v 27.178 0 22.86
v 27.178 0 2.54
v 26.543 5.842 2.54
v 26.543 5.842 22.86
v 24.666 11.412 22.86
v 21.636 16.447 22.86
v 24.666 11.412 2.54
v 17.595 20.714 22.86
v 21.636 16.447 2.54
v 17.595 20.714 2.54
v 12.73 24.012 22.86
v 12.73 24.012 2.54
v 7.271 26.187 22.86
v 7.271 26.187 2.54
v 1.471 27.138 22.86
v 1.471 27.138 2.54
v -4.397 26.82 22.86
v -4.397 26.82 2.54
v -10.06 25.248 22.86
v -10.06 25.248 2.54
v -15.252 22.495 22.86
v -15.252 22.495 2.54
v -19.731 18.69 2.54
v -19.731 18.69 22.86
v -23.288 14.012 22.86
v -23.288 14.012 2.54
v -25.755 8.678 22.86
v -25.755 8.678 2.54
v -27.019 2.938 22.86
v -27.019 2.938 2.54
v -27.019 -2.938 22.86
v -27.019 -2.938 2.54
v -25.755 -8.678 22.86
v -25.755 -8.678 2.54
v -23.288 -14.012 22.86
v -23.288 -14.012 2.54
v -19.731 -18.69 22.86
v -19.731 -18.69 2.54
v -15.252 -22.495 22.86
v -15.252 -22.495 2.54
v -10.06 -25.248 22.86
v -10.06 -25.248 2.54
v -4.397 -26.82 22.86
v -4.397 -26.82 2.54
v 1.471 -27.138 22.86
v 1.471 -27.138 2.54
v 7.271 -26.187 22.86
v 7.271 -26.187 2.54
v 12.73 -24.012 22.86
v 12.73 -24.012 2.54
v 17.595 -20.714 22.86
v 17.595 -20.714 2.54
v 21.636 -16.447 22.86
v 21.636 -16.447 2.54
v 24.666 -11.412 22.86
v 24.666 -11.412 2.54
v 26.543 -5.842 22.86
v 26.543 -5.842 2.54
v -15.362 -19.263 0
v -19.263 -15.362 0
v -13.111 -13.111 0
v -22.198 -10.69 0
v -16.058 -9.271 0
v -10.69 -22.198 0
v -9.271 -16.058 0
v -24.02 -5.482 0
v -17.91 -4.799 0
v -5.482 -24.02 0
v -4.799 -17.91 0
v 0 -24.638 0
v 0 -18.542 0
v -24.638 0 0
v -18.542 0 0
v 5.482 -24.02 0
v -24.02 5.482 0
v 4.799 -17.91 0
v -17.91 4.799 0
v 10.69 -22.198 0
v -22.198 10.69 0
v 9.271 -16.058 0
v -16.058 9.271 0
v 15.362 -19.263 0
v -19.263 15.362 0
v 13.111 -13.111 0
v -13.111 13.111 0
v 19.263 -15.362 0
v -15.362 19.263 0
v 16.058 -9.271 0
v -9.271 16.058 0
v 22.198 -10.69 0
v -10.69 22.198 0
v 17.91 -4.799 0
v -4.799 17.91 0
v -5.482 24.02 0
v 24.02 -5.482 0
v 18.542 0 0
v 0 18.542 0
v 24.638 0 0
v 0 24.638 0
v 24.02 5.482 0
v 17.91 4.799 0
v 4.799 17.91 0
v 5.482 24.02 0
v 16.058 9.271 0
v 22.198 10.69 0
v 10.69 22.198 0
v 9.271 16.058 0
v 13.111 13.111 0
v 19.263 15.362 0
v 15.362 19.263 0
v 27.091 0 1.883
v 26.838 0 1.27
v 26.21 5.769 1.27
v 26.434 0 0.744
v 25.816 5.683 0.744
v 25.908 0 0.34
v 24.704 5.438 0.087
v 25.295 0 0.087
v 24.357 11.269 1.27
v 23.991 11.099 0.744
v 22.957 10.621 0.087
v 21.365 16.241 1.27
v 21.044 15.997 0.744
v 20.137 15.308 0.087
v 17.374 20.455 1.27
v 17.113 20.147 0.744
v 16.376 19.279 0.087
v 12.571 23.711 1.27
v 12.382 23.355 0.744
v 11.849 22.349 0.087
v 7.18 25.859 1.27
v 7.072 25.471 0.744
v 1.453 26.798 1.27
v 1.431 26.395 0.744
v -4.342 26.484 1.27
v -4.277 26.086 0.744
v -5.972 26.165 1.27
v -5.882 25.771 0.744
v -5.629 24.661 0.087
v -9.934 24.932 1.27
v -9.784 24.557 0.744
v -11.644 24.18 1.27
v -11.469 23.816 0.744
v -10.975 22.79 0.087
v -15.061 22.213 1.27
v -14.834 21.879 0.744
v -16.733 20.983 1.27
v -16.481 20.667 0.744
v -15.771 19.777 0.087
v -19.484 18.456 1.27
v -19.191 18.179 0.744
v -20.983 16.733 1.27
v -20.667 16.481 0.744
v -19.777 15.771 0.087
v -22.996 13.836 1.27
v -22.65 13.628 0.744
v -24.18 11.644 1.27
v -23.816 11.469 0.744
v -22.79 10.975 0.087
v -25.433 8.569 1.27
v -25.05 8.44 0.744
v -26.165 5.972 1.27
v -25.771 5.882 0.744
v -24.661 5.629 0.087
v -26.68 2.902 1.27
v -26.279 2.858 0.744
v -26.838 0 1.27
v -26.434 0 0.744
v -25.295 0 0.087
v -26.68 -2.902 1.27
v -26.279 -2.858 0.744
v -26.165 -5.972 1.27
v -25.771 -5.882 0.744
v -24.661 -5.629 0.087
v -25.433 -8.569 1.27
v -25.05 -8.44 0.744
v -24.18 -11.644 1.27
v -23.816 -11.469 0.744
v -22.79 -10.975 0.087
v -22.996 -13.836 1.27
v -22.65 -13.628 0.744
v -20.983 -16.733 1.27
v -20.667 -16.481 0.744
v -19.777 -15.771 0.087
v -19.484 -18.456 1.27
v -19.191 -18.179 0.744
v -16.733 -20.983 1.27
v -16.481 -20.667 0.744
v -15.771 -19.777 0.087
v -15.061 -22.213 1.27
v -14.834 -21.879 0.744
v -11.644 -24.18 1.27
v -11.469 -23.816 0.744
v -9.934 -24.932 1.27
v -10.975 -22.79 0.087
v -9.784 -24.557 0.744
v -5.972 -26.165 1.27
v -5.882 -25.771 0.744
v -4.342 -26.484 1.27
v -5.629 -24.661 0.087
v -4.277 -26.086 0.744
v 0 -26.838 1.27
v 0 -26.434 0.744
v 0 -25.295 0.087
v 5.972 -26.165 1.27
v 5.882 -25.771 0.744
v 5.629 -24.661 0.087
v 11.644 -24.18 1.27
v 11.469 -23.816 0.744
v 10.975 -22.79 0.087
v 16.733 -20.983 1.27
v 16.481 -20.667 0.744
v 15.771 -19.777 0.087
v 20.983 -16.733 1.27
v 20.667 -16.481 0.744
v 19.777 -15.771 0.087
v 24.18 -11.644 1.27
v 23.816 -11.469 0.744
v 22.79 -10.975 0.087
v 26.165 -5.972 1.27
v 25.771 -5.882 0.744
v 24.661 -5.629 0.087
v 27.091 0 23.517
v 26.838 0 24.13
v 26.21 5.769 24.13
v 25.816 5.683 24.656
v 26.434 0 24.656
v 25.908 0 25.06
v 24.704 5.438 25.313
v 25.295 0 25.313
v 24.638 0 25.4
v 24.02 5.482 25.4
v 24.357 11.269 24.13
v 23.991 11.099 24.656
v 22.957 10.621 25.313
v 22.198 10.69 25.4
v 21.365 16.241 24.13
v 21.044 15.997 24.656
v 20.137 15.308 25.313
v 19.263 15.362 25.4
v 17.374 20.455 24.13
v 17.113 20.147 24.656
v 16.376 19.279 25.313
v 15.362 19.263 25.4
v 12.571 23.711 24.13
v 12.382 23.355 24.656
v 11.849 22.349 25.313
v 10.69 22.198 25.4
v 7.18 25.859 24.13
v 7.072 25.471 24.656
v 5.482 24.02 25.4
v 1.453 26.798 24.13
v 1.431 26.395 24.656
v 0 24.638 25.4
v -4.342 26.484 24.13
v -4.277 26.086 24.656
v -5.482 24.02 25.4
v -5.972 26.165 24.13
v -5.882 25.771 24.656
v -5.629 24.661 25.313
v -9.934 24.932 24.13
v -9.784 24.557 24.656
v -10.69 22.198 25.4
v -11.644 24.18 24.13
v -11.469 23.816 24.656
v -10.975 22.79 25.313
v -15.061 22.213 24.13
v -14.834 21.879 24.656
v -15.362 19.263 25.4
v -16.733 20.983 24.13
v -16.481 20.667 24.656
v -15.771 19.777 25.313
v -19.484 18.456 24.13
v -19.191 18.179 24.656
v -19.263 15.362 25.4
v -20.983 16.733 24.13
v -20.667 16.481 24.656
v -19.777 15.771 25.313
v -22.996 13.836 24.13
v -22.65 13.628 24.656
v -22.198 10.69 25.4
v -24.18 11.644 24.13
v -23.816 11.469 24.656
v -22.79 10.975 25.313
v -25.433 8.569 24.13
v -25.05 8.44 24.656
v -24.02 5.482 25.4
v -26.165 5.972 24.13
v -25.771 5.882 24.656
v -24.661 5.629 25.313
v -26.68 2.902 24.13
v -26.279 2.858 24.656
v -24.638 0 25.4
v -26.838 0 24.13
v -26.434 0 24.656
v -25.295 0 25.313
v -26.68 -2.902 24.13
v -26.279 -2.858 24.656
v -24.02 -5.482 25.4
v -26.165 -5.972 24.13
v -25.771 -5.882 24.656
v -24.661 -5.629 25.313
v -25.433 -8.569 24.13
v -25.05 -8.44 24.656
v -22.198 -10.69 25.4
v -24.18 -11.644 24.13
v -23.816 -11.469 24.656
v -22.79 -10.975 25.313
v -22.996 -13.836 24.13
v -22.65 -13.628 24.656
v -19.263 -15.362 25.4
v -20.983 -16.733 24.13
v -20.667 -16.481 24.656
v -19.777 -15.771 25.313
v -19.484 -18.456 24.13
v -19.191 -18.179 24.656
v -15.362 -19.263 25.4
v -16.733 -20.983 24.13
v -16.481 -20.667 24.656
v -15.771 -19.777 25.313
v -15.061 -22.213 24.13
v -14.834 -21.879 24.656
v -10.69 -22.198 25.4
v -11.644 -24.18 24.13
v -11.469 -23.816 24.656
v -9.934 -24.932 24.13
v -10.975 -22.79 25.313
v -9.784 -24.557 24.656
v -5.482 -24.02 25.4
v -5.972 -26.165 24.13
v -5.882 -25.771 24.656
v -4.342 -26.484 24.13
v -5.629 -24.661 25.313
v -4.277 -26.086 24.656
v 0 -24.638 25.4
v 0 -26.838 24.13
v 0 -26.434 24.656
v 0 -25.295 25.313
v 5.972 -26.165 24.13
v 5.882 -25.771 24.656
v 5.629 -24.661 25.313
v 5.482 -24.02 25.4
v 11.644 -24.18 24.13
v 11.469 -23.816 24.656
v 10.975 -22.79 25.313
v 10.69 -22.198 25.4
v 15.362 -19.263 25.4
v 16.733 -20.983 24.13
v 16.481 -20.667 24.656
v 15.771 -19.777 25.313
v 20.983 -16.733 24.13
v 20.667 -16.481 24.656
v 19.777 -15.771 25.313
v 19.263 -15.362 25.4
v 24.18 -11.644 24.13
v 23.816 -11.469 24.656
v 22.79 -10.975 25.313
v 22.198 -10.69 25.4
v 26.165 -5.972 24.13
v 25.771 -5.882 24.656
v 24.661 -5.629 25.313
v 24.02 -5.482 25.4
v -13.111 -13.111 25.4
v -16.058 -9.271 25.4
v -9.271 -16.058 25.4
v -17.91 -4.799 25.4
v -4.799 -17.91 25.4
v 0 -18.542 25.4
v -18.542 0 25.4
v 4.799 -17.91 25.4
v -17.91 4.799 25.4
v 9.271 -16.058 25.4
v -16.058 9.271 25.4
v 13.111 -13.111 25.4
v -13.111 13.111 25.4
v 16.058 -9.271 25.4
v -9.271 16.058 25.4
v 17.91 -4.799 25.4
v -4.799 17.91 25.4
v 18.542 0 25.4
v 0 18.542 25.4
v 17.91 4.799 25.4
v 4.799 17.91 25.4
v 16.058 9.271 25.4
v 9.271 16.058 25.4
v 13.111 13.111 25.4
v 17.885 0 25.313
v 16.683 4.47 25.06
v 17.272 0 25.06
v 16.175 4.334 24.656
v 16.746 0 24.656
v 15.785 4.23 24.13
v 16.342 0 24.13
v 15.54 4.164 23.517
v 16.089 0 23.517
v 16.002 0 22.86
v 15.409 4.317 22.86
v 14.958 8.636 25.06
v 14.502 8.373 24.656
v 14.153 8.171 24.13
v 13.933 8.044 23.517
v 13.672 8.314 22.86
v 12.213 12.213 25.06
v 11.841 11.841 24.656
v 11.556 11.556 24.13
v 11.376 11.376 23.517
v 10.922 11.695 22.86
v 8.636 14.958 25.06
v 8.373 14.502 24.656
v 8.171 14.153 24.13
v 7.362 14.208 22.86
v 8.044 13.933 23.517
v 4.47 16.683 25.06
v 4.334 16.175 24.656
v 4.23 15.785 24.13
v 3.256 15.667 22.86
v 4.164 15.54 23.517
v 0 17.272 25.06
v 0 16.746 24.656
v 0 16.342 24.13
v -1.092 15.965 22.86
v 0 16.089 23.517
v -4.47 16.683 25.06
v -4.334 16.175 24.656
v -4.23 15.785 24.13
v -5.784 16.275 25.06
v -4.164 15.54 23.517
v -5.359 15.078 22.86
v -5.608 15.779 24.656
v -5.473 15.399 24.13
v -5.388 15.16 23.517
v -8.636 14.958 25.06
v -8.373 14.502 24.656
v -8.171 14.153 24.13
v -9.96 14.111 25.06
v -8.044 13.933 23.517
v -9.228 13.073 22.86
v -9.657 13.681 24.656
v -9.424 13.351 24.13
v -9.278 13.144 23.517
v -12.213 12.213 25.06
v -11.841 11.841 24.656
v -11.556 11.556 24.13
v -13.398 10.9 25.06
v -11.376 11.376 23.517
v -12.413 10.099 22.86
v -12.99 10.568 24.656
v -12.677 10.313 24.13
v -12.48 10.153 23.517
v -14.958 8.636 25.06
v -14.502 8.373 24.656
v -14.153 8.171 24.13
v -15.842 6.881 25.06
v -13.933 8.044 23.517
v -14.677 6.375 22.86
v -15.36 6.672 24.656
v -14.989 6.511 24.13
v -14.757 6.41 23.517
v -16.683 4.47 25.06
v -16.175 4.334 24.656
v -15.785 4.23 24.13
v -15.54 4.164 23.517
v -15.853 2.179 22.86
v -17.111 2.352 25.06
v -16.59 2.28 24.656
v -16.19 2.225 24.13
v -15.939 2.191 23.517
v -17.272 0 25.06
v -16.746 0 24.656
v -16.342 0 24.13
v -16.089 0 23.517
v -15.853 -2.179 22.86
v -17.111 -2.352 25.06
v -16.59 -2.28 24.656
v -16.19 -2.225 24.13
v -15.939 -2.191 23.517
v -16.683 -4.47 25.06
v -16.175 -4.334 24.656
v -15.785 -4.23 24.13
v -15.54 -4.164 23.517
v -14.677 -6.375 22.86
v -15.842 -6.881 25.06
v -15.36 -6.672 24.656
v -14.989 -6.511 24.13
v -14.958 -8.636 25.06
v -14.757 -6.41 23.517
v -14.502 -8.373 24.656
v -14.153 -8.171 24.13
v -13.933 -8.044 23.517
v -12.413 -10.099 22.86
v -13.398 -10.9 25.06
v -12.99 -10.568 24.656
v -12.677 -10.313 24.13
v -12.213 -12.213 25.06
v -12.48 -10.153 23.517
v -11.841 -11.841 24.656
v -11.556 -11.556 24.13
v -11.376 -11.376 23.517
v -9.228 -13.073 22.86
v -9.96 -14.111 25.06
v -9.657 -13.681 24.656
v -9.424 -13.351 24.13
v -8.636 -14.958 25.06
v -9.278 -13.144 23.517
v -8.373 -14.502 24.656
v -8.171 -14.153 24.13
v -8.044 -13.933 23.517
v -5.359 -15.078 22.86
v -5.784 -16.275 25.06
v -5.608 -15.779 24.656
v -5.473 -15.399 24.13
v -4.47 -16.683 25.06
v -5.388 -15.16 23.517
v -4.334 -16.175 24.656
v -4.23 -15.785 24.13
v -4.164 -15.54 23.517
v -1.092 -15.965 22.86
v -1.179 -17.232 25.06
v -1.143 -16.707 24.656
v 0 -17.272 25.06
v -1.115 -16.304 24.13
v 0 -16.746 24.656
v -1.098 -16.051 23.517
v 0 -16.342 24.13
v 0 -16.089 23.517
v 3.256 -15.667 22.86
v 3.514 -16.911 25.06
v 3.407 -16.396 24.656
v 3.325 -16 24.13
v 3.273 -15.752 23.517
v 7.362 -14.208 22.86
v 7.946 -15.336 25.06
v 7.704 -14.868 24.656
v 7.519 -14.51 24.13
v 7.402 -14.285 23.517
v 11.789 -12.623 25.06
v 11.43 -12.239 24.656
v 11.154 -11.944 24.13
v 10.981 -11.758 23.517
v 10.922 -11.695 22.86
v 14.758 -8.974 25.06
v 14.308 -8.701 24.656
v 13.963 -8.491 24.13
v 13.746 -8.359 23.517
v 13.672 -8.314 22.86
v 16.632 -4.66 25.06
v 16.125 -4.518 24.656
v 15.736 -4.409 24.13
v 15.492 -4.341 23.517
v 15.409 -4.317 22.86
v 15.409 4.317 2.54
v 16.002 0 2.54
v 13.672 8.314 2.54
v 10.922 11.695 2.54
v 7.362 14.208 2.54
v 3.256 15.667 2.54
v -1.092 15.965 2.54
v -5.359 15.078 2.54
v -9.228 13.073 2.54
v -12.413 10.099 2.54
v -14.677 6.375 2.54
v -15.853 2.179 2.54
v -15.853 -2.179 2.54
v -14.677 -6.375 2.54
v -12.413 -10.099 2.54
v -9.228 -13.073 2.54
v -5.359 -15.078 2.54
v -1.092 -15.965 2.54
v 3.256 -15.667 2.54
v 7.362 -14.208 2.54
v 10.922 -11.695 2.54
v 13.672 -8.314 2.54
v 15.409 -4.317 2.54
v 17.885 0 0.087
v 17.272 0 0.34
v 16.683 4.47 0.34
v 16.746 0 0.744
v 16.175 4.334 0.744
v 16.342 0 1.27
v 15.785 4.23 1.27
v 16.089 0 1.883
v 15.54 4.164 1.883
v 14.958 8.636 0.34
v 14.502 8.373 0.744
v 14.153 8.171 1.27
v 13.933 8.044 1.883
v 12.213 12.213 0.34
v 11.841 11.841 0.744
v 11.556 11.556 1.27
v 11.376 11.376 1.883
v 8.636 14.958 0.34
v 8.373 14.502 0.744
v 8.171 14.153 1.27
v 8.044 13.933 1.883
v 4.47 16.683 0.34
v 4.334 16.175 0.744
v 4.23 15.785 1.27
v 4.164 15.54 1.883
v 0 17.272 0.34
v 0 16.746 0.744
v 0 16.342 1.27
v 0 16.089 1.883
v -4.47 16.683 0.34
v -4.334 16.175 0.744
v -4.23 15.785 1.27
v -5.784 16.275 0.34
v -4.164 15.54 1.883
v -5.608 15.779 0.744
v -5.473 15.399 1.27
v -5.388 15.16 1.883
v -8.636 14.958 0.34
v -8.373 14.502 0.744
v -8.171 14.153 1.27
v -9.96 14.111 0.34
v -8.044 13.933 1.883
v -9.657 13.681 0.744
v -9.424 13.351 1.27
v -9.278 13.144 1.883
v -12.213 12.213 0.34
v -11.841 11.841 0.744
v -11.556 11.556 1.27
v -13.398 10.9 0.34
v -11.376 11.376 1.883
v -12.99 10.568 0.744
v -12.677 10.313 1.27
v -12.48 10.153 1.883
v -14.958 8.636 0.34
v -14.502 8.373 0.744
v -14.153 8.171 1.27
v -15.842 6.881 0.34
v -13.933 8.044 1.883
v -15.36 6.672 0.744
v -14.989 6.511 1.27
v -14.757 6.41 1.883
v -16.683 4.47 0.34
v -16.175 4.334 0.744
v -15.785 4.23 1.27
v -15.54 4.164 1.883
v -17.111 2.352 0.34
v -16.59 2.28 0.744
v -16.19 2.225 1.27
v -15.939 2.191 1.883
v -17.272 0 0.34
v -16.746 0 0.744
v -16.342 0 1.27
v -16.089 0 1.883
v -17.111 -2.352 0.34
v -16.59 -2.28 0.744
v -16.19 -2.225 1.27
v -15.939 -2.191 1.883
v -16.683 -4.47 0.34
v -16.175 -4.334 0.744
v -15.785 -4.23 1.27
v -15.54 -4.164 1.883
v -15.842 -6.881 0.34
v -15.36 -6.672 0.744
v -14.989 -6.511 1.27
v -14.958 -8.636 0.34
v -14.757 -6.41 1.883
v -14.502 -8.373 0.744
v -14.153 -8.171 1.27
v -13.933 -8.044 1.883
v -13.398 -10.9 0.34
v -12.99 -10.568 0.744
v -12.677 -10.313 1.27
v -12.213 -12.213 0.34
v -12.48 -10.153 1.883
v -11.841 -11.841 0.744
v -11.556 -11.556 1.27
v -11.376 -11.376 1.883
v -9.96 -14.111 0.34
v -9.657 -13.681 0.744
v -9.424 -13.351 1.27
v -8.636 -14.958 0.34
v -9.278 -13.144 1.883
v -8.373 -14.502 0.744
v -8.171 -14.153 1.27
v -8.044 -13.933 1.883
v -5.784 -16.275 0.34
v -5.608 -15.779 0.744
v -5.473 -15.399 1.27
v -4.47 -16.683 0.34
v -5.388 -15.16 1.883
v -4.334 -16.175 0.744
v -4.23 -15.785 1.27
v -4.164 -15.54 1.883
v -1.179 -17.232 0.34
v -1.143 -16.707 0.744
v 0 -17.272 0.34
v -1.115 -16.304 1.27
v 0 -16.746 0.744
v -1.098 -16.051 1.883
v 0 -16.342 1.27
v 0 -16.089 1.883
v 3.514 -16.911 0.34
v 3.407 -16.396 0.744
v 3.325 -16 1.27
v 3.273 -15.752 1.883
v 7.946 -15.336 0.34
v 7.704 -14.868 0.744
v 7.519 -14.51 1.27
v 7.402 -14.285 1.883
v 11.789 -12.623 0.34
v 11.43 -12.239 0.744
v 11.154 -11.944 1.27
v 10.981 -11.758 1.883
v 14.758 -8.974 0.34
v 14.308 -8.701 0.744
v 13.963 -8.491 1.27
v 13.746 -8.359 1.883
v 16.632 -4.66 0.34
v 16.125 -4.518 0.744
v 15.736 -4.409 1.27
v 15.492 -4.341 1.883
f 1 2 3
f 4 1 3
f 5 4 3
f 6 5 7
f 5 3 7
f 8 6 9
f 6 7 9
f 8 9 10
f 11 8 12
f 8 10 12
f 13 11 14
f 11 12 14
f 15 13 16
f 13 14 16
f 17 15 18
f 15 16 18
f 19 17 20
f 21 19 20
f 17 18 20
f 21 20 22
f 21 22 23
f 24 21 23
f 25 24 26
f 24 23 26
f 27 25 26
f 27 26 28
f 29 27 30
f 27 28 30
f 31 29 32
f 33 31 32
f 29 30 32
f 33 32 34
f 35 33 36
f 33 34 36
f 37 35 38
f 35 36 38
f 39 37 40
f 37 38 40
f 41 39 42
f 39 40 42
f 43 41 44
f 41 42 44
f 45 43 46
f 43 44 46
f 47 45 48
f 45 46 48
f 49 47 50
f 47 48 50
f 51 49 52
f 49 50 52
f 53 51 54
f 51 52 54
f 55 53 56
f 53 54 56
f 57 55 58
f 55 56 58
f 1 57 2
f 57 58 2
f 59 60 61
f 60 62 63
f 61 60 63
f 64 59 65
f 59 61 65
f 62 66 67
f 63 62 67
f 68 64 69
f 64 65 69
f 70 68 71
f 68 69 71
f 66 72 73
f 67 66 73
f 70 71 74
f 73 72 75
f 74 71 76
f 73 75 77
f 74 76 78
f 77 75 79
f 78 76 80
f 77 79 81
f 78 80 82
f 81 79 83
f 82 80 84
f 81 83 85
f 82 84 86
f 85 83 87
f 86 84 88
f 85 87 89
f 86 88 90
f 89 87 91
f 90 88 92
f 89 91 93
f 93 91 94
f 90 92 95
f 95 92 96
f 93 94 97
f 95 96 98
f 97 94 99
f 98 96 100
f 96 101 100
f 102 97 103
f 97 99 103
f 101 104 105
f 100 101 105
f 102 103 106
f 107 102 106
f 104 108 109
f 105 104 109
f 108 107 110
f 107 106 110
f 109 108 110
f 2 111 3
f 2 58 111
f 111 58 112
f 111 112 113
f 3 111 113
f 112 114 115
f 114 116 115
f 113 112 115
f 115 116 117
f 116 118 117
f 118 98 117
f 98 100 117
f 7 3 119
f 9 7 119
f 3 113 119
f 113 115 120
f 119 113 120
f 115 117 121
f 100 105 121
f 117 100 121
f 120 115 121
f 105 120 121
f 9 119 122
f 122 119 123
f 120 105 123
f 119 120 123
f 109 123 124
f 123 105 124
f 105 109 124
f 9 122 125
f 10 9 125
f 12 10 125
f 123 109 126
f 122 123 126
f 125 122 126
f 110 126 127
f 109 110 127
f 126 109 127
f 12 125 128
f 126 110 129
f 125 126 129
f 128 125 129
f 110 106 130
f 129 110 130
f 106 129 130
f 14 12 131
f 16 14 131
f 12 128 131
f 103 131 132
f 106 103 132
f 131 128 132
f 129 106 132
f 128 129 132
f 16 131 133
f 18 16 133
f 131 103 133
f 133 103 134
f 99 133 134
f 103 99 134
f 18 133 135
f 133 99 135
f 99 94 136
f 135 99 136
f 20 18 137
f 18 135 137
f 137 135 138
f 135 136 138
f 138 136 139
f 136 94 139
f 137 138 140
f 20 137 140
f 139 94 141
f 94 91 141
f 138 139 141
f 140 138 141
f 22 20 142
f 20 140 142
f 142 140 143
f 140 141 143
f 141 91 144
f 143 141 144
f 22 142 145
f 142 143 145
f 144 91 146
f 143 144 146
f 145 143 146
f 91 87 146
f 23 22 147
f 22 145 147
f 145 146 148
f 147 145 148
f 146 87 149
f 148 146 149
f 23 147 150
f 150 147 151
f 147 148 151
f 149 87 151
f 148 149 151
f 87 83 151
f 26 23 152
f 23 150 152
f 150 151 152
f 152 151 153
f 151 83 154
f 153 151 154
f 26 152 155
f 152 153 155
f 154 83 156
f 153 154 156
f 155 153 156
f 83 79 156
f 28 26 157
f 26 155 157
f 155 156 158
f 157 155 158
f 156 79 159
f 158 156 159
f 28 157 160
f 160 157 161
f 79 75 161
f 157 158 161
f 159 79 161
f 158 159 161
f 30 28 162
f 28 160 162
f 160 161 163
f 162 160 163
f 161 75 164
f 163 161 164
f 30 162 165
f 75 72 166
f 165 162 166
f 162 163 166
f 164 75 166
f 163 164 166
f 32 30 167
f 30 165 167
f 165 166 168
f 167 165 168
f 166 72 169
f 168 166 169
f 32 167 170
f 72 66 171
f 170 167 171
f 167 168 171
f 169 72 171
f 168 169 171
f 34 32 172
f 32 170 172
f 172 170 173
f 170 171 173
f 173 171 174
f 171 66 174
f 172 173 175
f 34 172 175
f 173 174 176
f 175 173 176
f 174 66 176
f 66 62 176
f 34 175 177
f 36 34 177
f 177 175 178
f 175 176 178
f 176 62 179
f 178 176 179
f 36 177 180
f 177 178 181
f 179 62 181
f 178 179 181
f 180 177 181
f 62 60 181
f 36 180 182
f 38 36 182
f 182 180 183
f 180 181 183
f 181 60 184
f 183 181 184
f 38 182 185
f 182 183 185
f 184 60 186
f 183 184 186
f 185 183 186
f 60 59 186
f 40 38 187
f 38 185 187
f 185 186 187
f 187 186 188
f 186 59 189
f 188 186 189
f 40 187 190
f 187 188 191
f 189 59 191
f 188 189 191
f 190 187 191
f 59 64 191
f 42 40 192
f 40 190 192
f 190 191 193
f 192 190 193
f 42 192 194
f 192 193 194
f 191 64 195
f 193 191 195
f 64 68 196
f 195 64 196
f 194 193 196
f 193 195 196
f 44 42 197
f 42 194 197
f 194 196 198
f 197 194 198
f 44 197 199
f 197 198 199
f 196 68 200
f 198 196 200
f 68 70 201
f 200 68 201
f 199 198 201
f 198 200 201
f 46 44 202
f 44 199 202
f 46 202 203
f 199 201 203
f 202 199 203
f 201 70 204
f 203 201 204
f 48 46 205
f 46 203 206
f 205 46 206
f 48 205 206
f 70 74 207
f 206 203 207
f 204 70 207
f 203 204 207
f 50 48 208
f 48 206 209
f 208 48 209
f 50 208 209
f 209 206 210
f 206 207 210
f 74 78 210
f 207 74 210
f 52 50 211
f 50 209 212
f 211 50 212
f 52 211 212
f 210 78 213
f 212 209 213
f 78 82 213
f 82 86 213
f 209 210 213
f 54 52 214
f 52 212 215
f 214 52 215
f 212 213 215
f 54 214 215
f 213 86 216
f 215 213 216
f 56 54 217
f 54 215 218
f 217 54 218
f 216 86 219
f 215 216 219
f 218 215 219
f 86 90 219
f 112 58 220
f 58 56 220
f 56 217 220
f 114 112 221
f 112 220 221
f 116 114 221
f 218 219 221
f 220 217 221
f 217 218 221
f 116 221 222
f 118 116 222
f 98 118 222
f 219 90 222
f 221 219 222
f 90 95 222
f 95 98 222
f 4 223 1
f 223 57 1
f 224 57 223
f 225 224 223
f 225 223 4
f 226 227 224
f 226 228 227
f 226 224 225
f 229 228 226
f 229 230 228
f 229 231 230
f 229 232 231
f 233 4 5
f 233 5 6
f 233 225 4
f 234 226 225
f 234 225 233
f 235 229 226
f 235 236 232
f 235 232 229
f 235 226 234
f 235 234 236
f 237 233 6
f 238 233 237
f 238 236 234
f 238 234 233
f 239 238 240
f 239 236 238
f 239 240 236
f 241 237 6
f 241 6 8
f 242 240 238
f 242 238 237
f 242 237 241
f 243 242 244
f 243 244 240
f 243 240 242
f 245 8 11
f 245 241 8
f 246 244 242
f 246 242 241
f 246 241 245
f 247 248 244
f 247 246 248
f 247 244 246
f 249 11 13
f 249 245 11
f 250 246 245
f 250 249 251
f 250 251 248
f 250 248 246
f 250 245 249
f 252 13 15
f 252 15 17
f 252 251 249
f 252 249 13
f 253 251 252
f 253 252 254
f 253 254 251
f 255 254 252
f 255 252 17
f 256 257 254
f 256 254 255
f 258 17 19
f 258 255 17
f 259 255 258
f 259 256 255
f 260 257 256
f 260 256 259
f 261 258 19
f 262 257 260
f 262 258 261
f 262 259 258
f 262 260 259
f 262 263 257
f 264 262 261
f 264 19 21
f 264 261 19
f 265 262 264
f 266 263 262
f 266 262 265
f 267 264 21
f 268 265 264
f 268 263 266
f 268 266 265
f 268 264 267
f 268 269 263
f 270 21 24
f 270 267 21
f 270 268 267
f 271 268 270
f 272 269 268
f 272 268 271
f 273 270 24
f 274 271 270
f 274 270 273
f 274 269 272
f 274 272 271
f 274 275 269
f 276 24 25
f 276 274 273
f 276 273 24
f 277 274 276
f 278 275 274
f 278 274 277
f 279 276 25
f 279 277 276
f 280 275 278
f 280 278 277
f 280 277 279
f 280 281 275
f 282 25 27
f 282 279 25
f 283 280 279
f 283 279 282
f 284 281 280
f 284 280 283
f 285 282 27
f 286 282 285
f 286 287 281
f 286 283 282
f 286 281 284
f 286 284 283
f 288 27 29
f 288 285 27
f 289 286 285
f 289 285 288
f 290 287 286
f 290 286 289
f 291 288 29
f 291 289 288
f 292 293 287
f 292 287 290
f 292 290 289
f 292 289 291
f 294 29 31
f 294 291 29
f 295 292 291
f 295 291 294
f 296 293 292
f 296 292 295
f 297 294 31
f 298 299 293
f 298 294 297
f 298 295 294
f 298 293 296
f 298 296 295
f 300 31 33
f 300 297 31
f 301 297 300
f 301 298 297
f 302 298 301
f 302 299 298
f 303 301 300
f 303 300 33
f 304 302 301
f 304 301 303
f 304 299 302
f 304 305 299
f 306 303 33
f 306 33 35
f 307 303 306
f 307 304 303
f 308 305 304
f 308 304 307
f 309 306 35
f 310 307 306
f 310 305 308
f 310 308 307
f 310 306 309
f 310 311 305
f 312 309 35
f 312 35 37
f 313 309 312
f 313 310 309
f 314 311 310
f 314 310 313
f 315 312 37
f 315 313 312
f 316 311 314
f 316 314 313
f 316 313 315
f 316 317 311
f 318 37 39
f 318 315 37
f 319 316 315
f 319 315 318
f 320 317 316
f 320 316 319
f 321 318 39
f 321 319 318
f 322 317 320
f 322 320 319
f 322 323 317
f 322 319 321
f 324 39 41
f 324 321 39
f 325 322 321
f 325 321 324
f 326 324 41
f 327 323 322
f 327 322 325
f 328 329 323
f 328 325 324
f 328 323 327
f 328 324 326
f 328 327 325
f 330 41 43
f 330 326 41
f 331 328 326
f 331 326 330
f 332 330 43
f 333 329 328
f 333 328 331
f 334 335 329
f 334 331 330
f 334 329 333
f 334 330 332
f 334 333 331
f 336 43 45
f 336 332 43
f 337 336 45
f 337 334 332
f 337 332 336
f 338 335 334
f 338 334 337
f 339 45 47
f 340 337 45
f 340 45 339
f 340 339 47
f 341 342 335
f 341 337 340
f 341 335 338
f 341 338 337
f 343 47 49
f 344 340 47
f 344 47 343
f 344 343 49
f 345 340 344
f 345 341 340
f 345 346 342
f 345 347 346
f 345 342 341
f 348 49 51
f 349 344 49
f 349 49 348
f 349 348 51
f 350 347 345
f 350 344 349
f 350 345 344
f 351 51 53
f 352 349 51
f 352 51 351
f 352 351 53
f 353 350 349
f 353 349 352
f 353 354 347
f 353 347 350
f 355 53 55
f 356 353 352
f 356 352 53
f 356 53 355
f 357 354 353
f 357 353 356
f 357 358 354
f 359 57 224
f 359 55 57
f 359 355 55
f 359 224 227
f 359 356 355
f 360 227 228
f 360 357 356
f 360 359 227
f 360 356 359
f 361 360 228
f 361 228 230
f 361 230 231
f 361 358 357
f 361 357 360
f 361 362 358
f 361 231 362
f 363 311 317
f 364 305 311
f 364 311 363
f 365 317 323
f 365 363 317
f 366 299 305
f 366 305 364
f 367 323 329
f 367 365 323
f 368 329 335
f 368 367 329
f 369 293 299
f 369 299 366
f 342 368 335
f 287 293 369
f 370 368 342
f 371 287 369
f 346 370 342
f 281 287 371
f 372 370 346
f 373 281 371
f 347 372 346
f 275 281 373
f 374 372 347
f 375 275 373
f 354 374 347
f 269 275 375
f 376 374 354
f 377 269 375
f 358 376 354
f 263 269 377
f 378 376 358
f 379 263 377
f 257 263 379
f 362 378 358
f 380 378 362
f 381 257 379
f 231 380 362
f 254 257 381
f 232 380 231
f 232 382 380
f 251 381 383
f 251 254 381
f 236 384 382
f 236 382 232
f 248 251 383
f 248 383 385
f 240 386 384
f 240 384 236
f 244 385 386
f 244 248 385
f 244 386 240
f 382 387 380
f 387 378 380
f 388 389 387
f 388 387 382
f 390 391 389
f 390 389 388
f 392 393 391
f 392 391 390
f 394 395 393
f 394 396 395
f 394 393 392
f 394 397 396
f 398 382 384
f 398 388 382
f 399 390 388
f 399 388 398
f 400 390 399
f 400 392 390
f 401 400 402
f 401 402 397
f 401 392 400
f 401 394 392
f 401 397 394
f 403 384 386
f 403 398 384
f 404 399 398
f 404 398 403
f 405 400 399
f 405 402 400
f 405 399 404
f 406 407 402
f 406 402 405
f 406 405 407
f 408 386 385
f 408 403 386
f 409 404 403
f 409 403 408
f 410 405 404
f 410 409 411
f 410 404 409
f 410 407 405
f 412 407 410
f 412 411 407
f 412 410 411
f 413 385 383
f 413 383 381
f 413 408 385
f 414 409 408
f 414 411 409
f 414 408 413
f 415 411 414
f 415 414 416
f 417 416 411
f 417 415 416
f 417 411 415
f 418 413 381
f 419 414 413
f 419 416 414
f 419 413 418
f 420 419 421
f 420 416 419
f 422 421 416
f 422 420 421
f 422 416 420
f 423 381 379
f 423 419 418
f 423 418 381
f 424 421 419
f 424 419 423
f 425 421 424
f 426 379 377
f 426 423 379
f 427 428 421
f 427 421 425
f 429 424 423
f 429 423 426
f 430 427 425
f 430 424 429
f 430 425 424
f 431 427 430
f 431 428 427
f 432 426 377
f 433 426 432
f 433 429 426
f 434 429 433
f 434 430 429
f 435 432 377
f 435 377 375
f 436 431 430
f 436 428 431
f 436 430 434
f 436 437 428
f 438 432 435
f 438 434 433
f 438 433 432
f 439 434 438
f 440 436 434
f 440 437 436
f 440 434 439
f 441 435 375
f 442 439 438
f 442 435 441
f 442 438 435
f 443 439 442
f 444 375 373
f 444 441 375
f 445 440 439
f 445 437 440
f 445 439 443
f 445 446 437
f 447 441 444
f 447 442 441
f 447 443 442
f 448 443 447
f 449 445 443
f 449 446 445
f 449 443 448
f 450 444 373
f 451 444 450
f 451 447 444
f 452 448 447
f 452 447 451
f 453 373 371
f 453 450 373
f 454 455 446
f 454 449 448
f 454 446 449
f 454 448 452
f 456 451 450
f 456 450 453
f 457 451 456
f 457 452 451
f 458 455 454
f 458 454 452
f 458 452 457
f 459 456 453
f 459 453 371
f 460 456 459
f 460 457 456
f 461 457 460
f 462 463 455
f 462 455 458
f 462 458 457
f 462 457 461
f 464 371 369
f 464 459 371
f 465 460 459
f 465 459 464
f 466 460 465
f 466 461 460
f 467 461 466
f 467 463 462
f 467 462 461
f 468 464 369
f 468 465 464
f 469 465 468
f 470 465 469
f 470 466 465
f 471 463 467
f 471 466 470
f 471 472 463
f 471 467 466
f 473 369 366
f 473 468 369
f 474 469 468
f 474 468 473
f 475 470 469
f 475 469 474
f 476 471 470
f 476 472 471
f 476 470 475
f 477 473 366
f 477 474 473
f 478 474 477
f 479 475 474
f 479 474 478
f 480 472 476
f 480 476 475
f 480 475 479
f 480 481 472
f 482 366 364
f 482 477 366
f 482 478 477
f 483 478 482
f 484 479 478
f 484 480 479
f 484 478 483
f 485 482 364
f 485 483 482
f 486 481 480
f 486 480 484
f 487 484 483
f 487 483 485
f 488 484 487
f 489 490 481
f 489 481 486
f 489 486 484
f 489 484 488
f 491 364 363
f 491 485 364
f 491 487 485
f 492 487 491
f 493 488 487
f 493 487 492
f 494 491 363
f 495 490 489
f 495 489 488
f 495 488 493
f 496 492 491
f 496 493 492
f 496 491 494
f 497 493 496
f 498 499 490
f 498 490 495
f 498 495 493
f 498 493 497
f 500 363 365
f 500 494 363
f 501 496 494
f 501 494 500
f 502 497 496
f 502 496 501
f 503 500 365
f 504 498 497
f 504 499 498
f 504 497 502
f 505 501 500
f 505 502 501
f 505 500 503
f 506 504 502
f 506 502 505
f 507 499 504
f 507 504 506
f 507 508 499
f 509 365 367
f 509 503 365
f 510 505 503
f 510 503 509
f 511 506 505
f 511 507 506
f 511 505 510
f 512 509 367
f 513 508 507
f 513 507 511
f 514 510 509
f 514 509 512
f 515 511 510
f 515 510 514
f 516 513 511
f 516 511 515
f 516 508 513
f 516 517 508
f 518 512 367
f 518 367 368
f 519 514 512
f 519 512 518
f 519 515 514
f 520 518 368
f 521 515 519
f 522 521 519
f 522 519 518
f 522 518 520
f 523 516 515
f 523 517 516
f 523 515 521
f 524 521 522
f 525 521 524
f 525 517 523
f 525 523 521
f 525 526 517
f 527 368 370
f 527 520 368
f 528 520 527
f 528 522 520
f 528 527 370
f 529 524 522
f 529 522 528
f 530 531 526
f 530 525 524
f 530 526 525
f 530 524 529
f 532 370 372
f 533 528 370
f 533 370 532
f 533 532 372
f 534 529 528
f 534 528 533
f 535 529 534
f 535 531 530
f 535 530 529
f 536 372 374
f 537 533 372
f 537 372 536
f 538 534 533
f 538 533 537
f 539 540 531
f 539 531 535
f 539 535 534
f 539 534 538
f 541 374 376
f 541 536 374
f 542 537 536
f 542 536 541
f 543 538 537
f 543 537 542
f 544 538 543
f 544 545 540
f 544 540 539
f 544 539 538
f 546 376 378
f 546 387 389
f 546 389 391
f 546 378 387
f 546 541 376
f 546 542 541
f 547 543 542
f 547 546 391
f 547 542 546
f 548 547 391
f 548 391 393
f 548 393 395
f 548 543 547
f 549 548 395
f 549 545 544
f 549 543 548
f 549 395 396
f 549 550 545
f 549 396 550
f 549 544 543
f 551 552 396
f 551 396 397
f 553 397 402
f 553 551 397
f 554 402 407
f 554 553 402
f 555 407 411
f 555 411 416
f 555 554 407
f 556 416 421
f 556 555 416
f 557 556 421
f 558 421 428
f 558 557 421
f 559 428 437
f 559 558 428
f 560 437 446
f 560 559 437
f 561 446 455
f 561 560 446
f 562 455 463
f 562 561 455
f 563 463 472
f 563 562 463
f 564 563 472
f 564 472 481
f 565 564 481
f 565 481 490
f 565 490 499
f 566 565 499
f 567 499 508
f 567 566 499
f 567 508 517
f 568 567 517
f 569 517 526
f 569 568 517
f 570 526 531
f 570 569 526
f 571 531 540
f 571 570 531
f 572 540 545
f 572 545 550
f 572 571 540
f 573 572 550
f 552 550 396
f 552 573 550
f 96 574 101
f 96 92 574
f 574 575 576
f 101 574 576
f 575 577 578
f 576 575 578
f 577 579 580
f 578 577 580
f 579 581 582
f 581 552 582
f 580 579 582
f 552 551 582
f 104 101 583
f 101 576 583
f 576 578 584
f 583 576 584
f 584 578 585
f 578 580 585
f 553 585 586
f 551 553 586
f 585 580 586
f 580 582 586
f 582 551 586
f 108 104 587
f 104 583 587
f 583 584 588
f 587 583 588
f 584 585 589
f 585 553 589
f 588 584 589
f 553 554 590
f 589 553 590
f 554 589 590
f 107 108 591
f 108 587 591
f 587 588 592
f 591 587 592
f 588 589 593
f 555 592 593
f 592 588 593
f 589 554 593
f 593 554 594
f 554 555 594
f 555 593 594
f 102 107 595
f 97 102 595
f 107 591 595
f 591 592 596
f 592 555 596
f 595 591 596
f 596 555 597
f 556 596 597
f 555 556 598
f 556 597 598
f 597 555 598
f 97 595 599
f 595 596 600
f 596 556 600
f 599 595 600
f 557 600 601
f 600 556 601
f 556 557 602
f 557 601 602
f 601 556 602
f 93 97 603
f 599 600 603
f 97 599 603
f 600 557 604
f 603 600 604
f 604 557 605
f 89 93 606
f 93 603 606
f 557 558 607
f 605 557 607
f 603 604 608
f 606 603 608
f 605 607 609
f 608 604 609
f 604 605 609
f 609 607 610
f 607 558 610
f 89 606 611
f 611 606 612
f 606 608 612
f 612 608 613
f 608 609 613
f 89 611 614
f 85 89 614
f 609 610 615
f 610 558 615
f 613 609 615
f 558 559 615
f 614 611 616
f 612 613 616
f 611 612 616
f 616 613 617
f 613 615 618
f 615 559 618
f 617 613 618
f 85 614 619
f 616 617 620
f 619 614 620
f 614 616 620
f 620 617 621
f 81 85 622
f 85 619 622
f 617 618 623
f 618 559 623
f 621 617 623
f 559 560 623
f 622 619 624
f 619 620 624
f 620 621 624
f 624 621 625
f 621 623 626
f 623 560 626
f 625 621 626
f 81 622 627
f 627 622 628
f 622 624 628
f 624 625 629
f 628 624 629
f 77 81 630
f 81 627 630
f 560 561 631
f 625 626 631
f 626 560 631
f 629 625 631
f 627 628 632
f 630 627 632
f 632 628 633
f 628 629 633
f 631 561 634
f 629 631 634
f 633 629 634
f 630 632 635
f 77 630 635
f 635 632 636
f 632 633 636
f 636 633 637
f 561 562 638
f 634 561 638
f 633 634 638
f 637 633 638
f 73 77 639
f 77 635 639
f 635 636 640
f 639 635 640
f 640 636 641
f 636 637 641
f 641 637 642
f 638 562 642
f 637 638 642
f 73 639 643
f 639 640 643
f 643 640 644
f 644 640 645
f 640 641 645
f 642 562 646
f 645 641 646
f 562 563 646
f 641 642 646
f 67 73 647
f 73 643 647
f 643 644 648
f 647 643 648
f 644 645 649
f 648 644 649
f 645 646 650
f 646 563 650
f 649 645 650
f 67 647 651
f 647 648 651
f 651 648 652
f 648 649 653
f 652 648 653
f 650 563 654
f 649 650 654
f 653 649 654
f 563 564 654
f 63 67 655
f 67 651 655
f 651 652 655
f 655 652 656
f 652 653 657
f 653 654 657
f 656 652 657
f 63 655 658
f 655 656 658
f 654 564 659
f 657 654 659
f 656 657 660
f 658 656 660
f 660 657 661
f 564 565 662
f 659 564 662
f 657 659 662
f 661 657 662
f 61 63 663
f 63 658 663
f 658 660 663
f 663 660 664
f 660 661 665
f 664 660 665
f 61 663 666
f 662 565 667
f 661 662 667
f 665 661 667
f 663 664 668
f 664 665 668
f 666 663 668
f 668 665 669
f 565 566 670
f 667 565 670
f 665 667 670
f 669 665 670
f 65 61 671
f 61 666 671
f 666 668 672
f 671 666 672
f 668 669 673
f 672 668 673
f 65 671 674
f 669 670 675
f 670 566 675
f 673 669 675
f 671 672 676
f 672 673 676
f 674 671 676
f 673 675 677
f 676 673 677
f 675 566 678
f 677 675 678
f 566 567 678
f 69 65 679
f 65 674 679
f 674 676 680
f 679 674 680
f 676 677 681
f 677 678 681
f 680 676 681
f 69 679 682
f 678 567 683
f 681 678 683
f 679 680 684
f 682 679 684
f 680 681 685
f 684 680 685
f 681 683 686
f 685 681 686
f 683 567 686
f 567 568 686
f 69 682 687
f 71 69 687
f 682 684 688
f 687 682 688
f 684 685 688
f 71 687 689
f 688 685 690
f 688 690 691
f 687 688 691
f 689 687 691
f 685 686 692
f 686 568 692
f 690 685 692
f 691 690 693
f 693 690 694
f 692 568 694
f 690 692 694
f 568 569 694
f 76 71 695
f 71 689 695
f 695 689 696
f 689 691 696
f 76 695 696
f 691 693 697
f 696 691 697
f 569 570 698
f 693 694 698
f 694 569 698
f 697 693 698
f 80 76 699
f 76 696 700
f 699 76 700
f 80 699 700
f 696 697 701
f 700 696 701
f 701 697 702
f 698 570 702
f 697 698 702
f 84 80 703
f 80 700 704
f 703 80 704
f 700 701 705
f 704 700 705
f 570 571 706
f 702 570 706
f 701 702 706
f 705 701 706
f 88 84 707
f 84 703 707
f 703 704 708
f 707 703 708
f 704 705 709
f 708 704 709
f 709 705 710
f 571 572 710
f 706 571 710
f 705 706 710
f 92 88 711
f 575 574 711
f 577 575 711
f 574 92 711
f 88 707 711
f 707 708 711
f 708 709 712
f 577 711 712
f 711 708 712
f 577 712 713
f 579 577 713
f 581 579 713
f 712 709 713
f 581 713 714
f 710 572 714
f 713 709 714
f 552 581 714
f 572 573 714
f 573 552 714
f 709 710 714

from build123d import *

# Parameters (mm, degrees)
F0_R     = 27.178
F0_R_2   = 16.002
F1_DEPTH = 25.4
F2_R     = 2.54
F3_R     = 2.54


with BuildPart() as f1:
    # F0 (on Top) → F1 (new body)
    with BuildSketch(Plane.XY):
        Circle(F0_R)
        Circle(F0_R_2, mode=Mode.SUBTRACT)
    extrude(amount=F1_DEPTH)

    # F2
    f2_edges = [f1.edges().sort_by_distance(p)[0] for p in [
        (-27.178, 0, 0),
    ]]
    fillet(f2_edges, radius=F2_R)

    # F3
    f3_edges = [f1.edges().sort_by_distance(p)[0] for p in [
        (-16.002, 0, 0),
        (-27.178, 0, 25.4),
        (-16.002, 0, 25.4),
    ]]
    fillet(f3_edges, radius=F3_R)


solid = f1.part
